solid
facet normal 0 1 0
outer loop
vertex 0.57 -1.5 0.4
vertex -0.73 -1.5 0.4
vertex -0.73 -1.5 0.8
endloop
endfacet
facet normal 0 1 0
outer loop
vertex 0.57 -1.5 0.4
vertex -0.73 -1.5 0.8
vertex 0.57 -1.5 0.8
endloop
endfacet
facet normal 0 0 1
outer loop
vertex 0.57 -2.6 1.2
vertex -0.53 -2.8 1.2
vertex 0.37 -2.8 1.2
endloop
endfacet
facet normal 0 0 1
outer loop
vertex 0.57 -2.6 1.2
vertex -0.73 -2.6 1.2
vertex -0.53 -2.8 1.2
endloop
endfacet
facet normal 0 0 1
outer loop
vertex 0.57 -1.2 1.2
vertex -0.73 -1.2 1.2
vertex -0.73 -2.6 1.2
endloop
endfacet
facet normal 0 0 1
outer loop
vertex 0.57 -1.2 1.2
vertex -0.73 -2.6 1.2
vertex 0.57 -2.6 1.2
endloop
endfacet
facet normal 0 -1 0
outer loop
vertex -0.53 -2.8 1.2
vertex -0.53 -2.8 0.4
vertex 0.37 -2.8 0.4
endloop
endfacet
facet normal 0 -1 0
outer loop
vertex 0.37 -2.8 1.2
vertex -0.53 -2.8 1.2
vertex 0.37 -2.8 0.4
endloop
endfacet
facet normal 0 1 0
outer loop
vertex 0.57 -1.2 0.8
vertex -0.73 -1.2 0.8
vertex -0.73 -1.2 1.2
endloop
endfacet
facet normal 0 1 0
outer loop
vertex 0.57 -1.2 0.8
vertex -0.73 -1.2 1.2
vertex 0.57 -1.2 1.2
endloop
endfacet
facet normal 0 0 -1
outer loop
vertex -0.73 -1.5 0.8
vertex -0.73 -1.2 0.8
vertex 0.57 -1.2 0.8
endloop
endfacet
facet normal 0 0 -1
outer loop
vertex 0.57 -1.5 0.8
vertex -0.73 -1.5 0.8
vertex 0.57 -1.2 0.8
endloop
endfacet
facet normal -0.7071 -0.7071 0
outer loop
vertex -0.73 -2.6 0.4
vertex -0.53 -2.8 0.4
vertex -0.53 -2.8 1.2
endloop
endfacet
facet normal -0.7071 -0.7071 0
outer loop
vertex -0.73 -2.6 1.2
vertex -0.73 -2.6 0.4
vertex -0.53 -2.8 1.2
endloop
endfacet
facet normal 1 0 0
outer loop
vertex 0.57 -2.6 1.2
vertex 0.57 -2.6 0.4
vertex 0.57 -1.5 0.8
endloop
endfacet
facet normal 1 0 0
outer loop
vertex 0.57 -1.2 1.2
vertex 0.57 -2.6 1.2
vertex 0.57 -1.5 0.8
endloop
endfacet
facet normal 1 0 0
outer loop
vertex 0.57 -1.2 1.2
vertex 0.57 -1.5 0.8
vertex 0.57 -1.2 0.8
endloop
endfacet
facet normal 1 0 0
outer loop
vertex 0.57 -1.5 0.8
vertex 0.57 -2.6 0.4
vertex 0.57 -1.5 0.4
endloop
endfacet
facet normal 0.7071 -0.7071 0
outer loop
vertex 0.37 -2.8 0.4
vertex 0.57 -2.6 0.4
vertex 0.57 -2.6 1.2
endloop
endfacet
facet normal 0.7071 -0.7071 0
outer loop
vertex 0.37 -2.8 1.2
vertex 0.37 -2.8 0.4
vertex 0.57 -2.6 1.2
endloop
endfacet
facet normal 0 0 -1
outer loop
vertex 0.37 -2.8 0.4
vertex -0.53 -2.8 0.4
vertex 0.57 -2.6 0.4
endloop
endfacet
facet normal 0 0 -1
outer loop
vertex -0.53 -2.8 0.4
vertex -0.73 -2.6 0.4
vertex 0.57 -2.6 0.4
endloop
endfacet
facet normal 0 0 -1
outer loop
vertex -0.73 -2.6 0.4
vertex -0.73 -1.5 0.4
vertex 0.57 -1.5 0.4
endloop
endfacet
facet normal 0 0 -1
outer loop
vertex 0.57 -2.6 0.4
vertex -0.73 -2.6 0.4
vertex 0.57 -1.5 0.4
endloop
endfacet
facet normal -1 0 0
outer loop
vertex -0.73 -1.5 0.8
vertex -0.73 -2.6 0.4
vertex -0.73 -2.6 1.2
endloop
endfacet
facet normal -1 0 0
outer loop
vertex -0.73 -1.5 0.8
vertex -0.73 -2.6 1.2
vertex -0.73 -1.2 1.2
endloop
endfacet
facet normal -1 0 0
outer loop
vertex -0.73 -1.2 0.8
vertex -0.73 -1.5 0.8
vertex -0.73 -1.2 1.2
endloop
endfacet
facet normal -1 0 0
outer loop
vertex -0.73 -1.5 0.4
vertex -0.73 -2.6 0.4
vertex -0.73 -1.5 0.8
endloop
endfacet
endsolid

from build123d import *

# Parameters (mm, degrees)
BOX002_W        = 1.3
BOX002_H        = 1.3
BOX002_DEPTH    = 0.8
CHAMFER_SIZE    = 0.2
CHAMFER001_SIZE = 0.2
BOX001_W        = 1.3
BOX001_H        = 0.4
BOX001_DEPTH    = 0.4


with BuildPart() as chamfer001:
    # Box002 → Box002 (new body)
    with BuildSketch(Plane(origin=(-0.08, -2.8, 0.4), x_dir=(1, 0, 0), z_dir=(0, 0, 1))):
        with Locations((0.65, 0.65)):
            Rectangle(BOX002_W, BOX002_H)
    extrude(amount=BOX002_DEPTH)

    # Chamfer
    chamfer_edges = [chamfer001.edges().sort_by_distance(p)[0] for p in [
        (-0.08, -2.8, 0.8),
    ]]
    chamfer(chamfer_edges, length=CHAMFER_SIZE)

    # Chamfer001
    chamfer001_edges = [chamfer001.edges().sort_by_distance(p)[0] for p in [
        (1.22, -2.8, 0.8),
    ]]
    chamfer(chamfer001_edges, length=CHAMFER001_SIZE)


with BuildPart() as fusion:
    # Box001 → Box001 (new body)
    with BuildSketch(Plane(origin=(-0.08, -1.6, 0.8), x_dir=(1, 0, 0), z_dir=(0, 0, 1))):
        with Locations((0.65, 0.2)):
            Rectangle(BOX001_W, BOX001_H)
    extrude(amount=BOX001_DEPTH)

    # Fusion: union Chamfer001
    add(chamfer001.part)


with BuildPart() as fusion_1:
    # Fusion placement: moved
    add(fusion.part.moved(Location((-0.65, 0, 0))))


solid = fusion_1.part
